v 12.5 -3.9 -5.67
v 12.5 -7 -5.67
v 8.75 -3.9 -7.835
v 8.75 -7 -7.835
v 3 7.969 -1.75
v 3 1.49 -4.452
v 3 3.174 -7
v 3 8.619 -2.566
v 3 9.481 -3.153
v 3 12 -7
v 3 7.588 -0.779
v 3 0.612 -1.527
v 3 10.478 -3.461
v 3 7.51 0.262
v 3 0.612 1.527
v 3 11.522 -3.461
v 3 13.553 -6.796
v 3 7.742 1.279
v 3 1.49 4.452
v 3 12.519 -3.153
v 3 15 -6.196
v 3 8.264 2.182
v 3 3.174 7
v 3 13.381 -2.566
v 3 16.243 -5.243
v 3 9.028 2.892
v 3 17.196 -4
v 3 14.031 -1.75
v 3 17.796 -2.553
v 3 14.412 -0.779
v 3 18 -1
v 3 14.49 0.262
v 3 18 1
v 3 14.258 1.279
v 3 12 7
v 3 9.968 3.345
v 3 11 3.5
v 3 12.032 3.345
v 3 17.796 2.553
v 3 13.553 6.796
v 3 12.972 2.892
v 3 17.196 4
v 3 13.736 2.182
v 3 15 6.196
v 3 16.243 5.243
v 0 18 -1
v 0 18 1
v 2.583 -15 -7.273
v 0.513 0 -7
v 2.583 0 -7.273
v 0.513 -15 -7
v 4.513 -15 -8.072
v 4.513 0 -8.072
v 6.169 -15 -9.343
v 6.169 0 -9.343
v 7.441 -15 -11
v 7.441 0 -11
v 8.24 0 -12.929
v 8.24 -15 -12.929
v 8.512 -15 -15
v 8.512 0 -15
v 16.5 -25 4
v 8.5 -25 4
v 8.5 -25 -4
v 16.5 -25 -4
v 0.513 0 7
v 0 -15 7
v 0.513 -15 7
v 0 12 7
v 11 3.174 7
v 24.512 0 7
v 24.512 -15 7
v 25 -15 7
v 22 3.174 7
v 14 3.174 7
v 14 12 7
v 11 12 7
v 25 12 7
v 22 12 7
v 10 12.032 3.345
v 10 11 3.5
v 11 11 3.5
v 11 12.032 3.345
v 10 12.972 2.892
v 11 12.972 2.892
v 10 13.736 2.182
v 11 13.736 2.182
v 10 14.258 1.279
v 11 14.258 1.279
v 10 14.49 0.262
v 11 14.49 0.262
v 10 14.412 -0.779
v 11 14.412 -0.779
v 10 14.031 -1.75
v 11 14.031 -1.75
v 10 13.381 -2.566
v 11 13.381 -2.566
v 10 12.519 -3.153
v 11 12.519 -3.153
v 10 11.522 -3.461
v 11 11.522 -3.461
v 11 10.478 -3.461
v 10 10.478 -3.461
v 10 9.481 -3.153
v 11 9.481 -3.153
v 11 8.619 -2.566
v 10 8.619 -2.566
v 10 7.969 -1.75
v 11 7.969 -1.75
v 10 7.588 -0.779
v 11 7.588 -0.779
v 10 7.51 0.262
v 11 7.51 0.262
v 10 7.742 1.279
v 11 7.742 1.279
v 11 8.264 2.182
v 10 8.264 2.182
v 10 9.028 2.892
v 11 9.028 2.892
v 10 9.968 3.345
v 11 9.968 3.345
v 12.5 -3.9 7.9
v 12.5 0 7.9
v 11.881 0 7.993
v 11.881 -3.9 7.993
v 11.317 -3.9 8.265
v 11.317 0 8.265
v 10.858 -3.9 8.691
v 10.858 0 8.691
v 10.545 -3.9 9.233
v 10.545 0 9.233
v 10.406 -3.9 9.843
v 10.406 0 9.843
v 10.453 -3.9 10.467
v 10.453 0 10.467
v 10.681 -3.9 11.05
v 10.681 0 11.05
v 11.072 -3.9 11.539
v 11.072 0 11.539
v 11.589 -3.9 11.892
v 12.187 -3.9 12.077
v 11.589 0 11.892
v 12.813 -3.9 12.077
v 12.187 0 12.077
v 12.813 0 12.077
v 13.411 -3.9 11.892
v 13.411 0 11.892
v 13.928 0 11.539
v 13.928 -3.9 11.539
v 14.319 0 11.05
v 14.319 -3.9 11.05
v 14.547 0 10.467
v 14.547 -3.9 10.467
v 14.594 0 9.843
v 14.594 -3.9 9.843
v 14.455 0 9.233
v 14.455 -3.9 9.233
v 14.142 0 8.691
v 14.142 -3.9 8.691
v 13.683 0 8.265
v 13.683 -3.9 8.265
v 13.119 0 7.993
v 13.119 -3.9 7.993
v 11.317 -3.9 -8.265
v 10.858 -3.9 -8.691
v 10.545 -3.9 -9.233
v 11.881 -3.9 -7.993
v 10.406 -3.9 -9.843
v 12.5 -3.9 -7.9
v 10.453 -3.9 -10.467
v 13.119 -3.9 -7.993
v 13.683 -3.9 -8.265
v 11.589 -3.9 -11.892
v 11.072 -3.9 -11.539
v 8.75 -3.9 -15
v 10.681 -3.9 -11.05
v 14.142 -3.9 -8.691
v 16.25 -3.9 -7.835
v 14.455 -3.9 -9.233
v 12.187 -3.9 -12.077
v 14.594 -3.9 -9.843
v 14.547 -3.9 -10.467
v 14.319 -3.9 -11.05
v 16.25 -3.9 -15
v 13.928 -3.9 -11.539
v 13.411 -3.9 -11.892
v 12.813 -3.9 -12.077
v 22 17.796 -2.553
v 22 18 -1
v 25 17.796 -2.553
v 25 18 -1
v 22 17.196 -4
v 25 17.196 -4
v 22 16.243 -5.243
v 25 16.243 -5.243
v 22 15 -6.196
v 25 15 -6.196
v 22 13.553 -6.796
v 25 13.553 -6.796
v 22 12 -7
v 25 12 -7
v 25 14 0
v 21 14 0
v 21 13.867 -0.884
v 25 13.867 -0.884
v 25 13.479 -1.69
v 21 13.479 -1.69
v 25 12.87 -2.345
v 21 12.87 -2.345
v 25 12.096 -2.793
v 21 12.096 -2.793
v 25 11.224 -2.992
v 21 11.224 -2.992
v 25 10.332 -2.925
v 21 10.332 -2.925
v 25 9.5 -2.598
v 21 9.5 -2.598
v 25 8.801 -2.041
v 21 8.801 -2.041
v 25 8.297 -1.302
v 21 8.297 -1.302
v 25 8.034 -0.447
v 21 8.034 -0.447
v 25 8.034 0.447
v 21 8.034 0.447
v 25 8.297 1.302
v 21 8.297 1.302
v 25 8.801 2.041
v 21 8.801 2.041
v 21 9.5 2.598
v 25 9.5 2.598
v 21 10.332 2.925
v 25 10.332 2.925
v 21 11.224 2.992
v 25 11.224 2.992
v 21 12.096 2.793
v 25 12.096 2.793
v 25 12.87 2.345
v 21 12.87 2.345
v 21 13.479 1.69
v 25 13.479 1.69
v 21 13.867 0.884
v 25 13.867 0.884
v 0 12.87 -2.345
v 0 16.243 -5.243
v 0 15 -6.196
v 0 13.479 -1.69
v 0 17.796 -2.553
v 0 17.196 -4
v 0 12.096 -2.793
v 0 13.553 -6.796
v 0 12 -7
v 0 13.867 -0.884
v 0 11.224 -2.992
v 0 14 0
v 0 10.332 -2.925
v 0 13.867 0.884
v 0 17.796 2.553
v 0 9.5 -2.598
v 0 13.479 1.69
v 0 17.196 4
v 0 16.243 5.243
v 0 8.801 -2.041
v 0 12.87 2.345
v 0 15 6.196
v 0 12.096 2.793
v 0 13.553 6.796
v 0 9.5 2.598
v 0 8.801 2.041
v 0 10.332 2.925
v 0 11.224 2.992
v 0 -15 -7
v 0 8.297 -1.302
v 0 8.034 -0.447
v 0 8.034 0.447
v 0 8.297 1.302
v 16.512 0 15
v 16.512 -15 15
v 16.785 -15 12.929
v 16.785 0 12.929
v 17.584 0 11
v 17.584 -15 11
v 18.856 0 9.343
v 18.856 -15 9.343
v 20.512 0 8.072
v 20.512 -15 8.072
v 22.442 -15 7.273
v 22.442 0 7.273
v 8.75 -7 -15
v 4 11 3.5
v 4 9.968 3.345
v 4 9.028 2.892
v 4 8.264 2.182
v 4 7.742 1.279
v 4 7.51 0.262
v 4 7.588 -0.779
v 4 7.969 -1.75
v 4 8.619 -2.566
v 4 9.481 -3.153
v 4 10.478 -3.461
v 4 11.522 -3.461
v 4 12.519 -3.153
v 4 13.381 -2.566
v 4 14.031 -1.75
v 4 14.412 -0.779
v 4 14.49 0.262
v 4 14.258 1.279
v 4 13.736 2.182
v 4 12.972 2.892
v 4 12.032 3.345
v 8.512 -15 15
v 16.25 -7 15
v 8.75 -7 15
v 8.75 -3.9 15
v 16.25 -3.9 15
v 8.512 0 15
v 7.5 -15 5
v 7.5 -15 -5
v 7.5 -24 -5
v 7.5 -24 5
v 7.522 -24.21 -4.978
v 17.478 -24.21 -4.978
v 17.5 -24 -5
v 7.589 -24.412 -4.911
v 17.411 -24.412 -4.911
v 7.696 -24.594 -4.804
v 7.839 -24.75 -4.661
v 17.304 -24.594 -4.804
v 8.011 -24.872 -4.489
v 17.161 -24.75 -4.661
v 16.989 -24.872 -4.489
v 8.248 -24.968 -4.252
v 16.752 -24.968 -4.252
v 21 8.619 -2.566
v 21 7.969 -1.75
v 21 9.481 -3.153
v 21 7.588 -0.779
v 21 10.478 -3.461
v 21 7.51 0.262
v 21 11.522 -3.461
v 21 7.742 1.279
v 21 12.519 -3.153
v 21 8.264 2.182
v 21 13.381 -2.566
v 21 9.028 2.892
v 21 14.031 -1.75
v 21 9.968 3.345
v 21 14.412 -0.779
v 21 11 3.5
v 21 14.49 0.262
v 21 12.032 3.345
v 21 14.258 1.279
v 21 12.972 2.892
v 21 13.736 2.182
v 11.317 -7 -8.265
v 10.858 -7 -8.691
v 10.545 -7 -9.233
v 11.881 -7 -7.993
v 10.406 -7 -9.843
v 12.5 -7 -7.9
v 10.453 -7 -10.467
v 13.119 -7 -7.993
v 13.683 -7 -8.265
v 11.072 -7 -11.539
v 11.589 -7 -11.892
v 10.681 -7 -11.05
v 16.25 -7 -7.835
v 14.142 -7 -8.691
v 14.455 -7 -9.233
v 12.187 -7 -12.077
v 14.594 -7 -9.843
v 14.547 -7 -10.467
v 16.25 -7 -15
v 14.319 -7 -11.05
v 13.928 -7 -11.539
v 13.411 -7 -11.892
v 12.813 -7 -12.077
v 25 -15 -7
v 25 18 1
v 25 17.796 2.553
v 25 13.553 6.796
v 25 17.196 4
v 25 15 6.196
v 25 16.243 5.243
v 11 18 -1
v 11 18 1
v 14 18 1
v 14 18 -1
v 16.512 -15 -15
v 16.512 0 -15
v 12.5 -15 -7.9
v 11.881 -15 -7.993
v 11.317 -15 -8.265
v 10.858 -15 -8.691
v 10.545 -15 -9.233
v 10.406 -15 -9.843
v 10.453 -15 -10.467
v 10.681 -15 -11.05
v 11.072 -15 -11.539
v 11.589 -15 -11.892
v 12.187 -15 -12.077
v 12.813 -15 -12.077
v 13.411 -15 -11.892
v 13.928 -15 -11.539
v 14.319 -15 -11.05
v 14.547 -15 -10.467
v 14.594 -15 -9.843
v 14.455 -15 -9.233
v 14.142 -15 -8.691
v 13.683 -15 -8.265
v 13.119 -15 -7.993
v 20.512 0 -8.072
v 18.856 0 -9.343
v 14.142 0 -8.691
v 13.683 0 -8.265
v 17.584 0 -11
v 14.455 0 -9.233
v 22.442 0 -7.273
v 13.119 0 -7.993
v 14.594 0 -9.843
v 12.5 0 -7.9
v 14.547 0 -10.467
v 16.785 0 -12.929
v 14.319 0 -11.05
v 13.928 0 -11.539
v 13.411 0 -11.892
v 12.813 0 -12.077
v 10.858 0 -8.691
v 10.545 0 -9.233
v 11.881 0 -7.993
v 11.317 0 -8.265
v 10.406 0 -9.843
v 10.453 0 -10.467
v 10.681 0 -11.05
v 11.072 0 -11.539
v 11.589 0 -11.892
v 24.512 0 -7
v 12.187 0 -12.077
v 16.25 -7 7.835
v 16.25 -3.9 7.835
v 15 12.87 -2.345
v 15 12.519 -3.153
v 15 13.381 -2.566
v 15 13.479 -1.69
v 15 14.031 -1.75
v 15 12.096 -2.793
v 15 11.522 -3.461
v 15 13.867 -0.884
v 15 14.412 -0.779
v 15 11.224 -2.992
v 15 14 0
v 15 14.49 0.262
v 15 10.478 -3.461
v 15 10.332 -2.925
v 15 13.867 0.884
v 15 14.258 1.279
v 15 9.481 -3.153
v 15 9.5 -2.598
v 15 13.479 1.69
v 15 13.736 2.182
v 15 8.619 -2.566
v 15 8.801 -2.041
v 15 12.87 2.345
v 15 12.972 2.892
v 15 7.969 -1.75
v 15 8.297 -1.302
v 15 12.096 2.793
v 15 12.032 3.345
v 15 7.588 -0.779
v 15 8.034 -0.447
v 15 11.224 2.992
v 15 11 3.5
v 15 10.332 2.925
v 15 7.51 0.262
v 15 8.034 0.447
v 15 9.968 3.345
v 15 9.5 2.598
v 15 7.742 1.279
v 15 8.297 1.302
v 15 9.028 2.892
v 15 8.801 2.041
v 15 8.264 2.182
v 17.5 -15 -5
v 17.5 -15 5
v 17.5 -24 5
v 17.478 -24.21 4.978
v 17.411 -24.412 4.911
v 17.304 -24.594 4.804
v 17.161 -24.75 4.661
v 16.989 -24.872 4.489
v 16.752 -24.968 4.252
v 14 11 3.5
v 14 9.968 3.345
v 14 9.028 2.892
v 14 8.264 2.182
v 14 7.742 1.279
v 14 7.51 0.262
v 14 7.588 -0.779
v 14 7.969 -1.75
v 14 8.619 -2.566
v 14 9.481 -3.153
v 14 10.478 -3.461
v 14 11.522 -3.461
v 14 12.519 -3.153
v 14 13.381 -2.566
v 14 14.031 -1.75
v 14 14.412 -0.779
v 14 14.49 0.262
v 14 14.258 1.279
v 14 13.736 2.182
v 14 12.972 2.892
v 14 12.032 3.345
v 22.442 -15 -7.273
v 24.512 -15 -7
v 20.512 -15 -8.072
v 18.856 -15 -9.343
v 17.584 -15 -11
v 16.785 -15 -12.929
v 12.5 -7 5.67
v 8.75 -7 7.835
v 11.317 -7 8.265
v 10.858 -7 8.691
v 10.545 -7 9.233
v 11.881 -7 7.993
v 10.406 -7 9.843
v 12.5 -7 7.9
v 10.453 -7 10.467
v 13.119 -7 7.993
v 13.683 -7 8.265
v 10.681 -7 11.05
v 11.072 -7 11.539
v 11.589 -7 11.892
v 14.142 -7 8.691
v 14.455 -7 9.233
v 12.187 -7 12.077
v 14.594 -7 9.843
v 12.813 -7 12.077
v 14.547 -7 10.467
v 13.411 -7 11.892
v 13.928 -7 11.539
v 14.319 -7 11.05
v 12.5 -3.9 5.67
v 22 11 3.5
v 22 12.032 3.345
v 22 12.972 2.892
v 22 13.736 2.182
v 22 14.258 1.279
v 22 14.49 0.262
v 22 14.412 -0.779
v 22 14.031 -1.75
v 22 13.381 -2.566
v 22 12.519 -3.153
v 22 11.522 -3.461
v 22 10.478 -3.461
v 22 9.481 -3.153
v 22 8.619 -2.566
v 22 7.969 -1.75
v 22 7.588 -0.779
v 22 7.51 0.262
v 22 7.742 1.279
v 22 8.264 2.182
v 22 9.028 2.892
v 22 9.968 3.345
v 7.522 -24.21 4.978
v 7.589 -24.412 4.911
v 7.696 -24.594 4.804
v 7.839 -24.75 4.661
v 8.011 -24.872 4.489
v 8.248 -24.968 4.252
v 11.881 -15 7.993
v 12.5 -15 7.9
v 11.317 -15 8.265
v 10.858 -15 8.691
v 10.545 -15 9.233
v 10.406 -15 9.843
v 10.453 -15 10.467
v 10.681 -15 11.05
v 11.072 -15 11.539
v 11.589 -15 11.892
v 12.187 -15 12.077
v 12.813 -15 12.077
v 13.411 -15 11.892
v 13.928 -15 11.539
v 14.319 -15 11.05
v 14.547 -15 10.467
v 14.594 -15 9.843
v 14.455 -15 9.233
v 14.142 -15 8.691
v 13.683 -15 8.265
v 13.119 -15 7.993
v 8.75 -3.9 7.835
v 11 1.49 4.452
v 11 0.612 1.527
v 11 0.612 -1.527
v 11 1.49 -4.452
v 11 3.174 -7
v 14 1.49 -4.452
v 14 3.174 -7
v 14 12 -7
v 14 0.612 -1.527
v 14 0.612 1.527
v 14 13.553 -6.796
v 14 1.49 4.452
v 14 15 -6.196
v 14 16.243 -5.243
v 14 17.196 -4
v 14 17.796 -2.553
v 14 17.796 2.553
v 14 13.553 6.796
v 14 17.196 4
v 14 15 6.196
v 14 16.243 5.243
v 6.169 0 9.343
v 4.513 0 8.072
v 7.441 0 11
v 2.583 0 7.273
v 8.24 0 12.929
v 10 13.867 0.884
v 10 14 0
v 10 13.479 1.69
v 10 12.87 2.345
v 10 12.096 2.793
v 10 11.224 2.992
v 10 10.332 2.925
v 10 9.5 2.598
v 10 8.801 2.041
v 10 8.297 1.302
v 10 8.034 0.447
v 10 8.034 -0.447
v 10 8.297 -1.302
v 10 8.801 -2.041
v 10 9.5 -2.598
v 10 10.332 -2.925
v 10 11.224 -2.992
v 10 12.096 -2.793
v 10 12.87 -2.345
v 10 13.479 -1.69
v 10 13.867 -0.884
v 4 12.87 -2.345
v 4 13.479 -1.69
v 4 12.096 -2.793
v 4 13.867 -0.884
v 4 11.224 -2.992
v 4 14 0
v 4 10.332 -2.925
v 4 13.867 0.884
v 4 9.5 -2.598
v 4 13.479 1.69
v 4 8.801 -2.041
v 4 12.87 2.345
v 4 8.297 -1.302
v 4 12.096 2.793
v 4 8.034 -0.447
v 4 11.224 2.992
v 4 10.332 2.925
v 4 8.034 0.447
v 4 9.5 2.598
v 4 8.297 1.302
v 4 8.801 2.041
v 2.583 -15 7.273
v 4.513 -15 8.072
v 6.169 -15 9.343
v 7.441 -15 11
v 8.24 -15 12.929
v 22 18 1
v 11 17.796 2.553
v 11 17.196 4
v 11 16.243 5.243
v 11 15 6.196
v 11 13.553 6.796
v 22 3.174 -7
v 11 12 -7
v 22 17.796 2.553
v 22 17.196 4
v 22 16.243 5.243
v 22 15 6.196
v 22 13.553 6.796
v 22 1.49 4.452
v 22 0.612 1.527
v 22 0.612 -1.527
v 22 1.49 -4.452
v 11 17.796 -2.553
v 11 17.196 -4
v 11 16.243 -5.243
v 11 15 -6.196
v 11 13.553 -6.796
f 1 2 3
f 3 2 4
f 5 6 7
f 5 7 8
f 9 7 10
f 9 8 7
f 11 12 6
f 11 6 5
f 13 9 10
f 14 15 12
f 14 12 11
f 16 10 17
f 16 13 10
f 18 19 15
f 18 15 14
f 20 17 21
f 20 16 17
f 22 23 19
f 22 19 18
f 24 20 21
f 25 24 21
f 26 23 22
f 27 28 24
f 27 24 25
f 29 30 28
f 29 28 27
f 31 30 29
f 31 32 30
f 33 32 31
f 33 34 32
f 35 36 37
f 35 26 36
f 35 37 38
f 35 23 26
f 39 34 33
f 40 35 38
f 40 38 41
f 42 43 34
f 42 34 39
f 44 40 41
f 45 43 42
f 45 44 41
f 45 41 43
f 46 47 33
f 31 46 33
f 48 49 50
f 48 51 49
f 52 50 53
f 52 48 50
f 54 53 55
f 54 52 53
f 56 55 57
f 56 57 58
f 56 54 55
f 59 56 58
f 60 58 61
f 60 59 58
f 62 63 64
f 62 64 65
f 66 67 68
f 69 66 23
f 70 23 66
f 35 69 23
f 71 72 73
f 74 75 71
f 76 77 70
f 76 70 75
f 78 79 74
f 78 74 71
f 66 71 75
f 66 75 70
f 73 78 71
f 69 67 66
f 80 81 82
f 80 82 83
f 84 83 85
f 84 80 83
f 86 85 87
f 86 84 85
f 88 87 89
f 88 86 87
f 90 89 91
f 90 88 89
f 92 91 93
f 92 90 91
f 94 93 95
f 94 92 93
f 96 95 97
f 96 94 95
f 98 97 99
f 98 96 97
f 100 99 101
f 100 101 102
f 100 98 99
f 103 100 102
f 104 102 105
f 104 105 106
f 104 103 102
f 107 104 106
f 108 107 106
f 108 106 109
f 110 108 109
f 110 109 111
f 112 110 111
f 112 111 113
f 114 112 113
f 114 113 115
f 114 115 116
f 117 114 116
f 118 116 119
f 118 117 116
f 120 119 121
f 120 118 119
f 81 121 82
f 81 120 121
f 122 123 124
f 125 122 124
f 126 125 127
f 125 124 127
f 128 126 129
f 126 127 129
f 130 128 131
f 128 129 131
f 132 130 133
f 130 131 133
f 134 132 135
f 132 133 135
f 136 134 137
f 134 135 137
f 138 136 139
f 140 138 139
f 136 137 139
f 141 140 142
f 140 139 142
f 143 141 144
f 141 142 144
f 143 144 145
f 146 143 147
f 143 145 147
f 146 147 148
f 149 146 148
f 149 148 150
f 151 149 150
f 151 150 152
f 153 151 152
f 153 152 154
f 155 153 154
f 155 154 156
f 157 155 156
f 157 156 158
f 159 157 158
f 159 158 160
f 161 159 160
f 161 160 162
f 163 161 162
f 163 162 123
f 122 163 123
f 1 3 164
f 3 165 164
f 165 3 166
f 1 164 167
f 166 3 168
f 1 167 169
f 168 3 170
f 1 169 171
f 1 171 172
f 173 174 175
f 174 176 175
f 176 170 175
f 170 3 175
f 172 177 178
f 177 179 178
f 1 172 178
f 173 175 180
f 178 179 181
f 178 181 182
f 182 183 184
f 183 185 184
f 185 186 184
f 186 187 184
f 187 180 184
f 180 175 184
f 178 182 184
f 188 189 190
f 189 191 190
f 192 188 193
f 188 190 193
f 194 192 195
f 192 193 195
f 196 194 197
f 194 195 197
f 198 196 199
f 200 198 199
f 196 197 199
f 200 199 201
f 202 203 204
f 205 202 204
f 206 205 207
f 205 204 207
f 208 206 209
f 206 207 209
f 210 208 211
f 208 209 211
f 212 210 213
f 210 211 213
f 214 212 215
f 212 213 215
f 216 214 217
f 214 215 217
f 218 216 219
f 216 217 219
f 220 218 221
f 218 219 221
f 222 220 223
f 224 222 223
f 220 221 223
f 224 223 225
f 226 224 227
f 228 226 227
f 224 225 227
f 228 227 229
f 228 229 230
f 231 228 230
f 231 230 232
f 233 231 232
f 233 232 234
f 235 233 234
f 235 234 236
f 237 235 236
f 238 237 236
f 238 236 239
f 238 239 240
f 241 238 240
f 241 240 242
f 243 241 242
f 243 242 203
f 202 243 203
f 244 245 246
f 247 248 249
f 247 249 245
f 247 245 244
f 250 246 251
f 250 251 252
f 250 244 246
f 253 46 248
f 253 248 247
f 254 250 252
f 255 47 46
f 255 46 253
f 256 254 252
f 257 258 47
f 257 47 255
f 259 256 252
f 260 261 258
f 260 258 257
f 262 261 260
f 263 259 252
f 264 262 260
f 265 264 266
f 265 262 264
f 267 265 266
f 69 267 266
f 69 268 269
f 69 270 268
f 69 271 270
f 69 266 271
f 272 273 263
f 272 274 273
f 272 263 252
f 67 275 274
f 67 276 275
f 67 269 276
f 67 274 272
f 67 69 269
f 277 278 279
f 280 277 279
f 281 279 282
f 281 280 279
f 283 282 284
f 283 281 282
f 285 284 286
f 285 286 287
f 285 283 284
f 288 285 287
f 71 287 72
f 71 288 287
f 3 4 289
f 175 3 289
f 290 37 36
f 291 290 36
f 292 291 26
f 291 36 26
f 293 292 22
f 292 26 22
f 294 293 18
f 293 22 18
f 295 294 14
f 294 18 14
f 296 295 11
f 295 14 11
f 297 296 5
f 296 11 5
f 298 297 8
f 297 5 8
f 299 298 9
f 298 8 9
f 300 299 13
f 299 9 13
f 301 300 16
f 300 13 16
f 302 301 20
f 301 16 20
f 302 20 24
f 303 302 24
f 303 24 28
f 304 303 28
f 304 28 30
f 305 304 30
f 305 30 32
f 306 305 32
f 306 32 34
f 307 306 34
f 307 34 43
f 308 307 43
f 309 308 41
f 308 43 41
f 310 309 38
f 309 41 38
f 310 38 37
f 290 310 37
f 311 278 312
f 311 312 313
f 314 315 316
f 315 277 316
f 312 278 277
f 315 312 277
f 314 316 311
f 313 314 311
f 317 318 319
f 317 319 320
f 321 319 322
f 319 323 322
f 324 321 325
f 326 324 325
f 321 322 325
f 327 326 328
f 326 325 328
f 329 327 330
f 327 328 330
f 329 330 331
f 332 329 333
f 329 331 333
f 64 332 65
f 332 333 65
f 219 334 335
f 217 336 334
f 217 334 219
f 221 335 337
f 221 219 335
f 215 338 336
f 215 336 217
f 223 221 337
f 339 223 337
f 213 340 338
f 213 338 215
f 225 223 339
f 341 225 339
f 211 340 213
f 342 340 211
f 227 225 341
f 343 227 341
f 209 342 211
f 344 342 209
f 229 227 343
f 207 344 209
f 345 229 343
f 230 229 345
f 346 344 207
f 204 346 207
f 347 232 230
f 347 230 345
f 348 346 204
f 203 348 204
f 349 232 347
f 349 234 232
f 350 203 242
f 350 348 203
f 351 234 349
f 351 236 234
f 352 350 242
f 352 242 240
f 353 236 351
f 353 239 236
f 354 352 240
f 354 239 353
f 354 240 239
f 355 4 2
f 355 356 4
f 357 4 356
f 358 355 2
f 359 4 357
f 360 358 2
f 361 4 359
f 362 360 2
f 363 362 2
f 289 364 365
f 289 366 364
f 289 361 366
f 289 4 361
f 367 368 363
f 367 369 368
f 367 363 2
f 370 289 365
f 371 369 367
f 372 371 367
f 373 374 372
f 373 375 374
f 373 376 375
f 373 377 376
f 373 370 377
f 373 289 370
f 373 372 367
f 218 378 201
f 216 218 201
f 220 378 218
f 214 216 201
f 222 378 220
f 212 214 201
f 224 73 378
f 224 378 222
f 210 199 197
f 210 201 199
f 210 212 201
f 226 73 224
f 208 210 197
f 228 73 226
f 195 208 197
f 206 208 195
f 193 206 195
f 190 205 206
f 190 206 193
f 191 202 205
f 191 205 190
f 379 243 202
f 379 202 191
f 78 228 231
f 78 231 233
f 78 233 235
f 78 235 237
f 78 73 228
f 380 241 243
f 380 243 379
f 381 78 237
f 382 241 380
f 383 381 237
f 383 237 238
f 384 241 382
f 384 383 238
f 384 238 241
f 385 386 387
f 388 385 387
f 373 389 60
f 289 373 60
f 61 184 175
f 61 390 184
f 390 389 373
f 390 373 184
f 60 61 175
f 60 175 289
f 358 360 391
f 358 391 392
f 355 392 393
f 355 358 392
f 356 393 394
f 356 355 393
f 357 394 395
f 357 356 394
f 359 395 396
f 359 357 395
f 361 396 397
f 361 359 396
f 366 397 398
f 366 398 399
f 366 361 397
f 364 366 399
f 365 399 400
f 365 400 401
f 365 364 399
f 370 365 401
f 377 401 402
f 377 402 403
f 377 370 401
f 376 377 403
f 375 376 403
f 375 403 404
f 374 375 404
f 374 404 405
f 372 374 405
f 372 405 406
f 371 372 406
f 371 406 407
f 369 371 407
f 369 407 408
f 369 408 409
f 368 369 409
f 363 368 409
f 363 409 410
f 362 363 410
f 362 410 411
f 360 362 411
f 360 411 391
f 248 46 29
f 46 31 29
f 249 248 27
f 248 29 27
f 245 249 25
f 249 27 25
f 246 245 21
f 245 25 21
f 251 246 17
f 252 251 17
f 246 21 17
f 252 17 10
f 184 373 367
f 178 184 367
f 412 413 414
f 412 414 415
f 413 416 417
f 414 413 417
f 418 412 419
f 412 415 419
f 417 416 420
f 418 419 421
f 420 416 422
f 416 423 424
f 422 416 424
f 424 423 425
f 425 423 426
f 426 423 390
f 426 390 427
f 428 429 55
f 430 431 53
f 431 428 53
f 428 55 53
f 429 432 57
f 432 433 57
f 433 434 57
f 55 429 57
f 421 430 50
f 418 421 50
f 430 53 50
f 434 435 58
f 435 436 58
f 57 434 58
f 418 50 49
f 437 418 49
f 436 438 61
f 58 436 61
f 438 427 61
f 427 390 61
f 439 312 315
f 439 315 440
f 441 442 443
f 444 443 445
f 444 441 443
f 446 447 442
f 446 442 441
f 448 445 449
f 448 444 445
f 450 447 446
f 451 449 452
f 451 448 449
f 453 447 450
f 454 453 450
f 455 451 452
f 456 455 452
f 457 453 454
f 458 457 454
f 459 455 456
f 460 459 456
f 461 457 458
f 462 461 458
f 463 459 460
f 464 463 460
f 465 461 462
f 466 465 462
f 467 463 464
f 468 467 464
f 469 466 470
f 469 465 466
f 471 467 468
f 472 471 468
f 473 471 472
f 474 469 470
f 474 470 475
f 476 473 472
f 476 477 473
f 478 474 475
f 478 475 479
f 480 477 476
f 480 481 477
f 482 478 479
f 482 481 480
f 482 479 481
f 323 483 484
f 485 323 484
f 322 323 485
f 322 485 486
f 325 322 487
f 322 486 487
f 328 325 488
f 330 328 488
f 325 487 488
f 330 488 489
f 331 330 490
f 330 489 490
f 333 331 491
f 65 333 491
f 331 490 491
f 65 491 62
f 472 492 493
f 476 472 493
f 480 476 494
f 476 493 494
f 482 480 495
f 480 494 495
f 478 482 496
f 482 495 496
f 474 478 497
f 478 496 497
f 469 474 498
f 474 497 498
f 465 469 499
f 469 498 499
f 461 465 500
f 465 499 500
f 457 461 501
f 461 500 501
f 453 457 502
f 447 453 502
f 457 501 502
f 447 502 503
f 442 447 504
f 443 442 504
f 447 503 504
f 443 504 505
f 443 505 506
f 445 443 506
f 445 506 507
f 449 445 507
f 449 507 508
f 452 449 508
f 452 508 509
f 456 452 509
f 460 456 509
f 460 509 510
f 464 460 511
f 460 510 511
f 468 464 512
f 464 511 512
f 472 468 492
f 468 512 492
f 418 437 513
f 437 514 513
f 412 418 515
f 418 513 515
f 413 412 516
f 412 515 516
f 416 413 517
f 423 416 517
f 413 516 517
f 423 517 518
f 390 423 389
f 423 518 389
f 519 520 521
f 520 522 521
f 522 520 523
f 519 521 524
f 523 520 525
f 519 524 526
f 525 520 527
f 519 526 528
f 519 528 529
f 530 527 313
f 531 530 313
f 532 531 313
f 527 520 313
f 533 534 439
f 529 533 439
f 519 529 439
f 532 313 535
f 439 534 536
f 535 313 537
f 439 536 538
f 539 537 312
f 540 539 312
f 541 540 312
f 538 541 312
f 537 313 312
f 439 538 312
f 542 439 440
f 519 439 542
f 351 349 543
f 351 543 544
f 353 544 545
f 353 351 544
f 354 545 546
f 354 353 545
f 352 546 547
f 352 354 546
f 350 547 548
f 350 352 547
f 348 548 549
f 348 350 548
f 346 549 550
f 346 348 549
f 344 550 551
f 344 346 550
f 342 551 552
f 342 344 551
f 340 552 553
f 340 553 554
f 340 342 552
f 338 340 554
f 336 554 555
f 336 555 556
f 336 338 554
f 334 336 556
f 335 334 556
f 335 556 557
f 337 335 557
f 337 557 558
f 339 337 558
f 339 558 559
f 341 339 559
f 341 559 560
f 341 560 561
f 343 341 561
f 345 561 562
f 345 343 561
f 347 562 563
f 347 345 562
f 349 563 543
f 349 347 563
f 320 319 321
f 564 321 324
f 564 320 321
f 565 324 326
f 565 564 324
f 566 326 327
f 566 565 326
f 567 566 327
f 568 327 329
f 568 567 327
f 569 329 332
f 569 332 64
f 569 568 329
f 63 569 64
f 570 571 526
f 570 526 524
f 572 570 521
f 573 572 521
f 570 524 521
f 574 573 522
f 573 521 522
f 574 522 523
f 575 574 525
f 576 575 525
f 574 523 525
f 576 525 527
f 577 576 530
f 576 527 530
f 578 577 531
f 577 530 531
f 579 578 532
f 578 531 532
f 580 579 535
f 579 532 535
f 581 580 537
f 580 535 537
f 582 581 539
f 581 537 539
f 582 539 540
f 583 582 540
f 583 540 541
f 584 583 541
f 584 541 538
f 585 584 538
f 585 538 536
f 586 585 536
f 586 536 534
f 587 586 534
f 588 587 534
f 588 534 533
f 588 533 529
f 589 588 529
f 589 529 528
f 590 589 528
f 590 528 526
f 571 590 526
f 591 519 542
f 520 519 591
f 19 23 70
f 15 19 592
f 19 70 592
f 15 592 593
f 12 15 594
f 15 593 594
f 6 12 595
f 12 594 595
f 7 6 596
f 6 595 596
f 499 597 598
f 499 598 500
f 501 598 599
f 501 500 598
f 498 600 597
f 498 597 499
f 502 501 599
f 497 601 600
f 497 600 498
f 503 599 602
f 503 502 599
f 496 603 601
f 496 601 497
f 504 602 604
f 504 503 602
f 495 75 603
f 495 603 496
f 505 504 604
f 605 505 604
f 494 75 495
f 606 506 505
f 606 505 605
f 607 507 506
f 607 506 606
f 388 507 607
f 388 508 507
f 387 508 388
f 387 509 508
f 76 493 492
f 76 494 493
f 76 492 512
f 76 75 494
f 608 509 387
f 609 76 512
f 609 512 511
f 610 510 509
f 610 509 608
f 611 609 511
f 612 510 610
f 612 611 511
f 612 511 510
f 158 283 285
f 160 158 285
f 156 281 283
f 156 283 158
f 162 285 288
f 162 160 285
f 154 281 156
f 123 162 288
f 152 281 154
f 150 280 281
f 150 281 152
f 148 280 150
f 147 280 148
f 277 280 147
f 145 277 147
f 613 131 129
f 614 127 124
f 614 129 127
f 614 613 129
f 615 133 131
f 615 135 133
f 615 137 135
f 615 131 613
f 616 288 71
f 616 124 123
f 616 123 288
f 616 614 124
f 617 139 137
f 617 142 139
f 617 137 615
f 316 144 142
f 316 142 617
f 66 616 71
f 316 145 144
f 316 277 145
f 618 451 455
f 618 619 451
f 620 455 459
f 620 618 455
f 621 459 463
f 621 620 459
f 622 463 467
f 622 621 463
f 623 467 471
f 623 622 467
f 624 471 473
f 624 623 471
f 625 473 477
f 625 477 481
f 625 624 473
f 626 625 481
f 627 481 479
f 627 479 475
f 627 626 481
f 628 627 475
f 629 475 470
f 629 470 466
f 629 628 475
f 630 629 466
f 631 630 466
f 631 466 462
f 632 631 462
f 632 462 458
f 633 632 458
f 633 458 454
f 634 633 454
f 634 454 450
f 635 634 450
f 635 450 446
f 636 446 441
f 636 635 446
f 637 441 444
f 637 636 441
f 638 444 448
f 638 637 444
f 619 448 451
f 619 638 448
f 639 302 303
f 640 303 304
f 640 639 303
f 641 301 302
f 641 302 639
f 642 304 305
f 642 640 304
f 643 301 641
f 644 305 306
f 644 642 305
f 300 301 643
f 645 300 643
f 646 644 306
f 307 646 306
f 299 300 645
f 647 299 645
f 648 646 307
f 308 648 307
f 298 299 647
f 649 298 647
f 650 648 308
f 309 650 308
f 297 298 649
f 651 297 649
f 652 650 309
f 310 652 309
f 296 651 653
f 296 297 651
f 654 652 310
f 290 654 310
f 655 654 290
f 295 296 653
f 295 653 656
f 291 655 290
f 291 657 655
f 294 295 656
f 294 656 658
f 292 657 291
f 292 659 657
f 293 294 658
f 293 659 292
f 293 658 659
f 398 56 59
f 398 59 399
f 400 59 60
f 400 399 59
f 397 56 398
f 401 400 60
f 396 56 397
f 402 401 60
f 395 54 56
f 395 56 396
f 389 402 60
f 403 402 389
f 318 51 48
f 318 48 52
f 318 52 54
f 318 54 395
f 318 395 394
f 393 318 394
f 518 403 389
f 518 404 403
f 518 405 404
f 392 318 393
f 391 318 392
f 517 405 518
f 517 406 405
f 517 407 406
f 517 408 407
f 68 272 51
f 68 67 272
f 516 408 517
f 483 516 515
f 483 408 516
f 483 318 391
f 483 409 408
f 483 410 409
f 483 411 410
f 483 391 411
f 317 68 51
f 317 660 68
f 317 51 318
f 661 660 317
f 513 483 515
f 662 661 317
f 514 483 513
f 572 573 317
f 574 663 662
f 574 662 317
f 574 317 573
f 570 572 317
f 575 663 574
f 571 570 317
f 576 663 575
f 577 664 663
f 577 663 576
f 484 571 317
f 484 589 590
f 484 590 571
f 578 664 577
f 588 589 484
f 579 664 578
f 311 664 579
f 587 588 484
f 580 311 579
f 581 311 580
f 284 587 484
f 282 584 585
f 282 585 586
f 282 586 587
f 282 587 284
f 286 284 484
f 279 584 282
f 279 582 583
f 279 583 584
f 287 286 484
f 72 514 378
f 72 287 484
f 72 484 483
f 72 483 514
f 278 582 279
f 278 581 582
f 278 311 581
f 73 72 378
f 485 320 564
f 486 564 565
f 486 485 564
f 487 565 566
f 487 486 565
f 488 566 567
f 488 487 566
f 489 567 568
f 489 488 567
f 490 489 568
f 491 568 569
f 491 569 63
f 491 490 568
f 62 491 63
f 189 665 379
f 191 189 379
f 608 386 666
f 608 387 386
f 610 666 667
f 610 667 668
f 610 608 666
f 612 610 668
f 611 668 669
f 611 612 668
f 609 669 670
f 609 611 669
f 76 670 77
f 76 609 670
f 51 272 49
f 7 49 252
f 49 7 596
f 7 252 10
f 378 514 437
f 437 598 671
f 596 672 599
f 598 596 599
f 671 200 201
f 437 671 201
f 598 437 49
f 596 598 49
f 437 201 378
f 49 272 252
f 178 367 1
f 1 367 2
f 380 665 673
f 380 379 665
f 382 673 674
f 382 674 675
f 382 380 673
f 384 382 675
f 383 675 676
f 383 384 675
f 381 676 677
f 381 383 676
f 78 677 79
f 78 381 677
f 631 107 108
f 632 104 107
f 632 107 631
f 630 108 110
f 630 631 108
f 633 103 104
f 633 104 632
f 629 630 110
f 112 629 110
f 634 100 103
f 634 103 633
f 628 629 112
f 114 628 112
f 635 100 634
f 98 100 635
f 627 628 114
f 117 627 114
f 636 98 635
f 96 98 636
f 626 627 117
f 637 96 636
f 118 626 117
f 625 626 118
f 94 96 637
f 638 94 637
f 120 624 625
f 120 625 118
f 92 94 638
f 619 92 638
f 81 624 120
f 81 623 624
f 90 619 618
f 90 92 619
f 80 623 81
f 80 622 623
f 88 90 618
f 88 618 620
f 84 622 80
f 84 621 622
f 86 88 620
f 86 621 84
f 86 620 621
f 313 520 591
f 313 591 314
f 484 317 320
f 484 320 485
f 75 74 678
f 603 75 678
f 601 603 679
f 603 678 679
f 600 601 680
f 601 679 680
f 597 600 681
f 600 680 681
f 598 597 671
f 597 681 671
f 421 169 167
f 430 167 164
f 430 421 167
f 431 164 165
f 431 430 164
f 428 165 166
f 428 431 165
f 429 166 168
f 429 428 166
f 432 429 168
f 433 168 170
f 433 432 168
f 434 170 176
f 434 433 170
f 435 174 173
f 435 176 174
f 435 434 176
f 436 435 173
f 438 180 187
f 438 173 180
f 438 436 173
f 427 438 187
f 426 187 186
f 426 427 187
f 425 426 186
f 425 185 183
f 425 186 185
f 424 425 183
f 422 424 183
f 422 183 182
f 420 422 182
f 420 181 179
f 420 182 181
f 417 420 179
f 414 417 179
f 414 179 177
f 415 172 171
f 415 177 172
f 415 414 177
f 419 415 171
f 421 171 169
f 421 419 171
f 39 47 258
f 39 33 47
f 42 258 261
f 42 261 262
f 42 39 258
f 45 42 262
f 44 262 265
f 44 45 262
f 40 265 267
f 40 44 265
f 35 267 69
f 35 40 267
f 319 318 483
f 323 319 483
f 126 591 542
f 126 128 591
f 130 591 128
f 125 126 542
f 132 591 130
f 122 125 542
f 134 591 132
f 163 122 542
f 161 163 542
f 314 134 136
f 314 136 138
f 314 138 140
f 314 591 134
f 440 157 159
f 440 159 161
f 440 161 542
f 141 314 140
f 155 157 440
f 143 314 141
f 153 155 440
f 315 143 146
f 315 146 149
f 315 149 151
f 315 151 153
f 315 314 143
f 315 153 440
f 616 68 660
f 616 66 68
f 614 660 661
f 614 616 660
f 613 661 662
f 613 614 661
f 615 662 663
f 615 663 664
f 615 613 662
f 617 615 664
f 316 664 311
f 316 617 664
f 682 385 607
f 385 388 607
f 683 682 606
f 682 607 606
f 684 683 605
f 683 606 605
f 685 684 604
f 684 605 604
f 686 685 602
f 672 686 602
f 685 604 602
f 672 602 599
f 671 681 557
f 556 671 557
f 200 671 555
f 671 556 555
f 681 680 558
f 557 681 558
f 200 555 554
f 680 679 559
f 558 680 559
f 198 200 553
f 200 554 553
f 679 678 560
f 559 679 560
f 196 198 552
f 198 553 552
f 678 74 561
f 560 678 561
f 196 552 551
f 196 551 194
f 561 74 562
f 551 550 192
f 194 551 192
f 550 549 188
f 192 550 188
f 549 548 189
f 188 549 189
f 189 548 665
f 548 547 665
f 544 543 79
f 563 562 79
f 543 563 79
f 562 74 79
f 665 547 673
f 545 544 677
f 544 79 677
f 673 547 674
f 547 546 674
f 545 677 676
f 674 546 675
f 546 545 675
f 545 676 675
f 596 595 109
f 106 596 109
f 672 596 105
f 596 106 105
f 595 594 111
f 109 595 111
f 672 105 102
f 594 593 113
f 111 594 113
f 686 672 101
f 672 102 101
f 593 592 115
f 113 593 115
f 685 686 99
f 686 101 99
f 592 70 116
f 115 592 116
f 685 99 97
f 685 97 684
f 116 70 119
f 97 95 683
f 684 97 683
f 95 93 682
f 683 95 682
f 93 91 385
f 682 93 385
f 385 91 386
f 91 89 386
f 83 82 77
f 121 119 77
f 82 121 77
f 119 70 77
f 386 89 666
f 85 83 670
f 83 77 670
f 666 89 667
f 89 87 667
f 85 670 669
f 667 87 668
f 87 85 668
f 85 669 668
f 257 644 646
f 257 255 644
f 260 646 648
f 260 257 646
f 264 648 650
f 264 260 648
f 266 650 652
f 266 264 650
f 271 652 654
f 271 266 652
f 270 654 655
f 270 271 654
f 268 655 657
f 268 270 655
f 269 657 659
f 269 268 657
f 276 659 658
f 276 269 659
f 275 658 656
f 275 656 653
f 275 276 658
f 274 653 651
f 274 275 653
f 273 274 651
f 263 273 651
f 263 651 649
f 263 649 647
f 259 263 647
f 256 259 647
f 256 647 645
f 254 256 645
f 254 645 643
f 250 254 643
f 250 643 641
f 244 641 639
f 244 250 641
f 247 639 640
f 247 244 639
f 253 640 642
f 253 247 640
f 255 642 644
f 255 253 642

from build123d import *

# Parameters (mm, degrees)
SKETCH_1_W               = 3
SKETCH_1_H               = 18
EXTRUDE_2_DEPTH          = 7
CUT_EXTRUDE_1_DEPTH      = 32.591137998
CUT_EXTRUDE_1_DEPTH_BACK = 7.591137998
CUT_EXTRUDE_1_START      = -25
SKETCH_3_R               = 3
SKETCH_15_R              = 3.5
SKETCH_15_R_2            = 3
EXTRUDE_11_DEPTH         = 1
EXTRUDE_START            = 1
SKETCH_5_R               = 3.5
SKETCH_5_R_2             = 3
EXTRUDE_6_DEPTH          = 1
SKETCH_6_R               = 3.5
SKETCH_6_R_2             = 3
EXTRUDE_7_DEPTH          = 1
SKETCH_7_R               = 3.5
SKETCH_7_R_2             = 3
EXTRUDE_8_DEPTH          = 1
FILLET_1_R               = 6
SKETCH_8_W               = 10
SKETCH_8_H               = 10
EXTRUDE_9_DEPTH          = 10
FILLET_2_R               = 1
EXTRUDE_START_2          = -22
EXTRUDE_14_DEPTH         = 19
SKETCH_17_W              = 8
SKETCH_17_H              = 8
SKETCH_17_R              = 2.1
EXTRUDE_12_DEPTH         = 8
EXTRUDE_START_3          = -7
SKETCH_17_2_W            = 8
SKETCH_17_2_H            = 8
SKETCH_17_2_R            = 2.1
EXTRUDE_13_DEPTH         = 7
CUT_EXTRUDE_2_DEPTH      = 3.1
FILLET_4_R               = 8


with BuildPart() as part:
    # 草图1 → 凸台-拉伸2 (new, symmetric)
    with BuildSketch(Plane.XY):
        Polygon((3, 0), (0, 0), (0, -15), (25, -15), (25, 0), (22, 0), (14, 0), (11, 0), align=None)
        with Locations((12.5, 9)):
            Rectangle(SKETCH_1_W, SKETCH_1_H)
        with Locations((23.5, 9)):
            Rectangle(SKETCH_1_W, SKETCH_1_H)
        with Locations((1.5, 9)):
            Rectangle(SKETCH_1_W, SKETCH_1_H)
    extrude(amount=EXTRUDE_2_DEPTH, both=True)

    # 草图3 → 切除-拉伸1 (cut, two sides: drawn at the far end of the back side and taken through both)
    with BuildSketch(Plane(origin=(25, 0, 0), x_dir=(0, 0, -1), z_dir=(1, 0, 0)).offset(CUT_EXTRUDE_1_START - CUT_EXTRUDE_1_DEPTH_BACK)):
        with Locations(Location((0, 11, 0), (0, 0, 90))):
            Circle(SKETCH_3_R)
    extrude(amount=CUT_EXTRUDE_1_DEPTH + CUT_EXTRUDE_1_DEPTH_BACK, mode=Mode.SUBTRACT)

    # 草图15 → 凸台-拉伸11 (add)
    with BuildSketch(Plane(origin=(3, 0, 0), x_dir=(0, 0, -1), z_dir=(1, 0, 0))):
        with Locations(Location((0, 11, 0), (0, 0, 180))):
            Circle(SKETCH_15_R)
        with Locations(Location((0, 11, 0), (0, 0, 90))):
            Circle(SKETCH_15_R_2, mode=Mode.SUBTRACT)
    extrude(amount=EXTRUDE_11_DEPTH)

    # 草图5 → 凸台-拉伸6 (add)
    with BuildSketch(Plane.ZY.offset(-11).offset(EXTRUDE_START)):
        with Locations((0, 11)):
            Circle(SKETCH_5_R)
        with Locations(Location((0, 11, 0), (0, 0, 90))):
            Circle(SKETCH_5_R_2, mode=Mode.SUBTRACT)
    extrude(amount=-EXTRUDE_6_DEPTH)

    # 草图6 → 凸台-拉伸7 (add)
    with BuildSketch(Plane(origin=(14, 0, 0), x_dir=(0, 0, -1), z_dir=(1, 0, 0))):
        with Locations(Location((0, 11, 0), (0, 0, 180))):
            Circle(SKETCH_6_R)
        with Locations(Location((0, 11, 0), (0, 0, 90))):
            Circle(SKETCH_6_R_2, mode=Mode.SUBTRACT)
    extrude(amount=EXTRUDE_7_DEPTH)

    # 草图7 → 凸台-拉伸8 (add)
    with BuildSketch(Plane.ZY.offset(-22).offset(EXTRUDE_START)):
        with Locations((0, 11)):
            Circle(SKETCH_7_R)
        with Locations(Location((0, 11, 0), (0, 0, 90))):
            Circle(SKETCH_7_R_2, mode=Mode.SUBTRACT)
    extrude(amount=-EXTRUDE_8_DEPTH)

    # 圆角1
    fillet_1_edges = [part.edges().sort_by_distance(p)[0] for p in [
        (23.5, 18, 7),
        (1.5, 18, -7),
        (12.5, 18, -7),
        (23.5, 18, -7),
        (12.5, 18, 7),
        (1.5, 18, 7),
    ]]
    fillet(fillet_1_edges, radius=FILLET_1_R)

    # 草图8 → 凸台-拉伸9 (add)
    with BuildSketch(Plane.XZ.offset(15)):
        with Locations((12.5, 0)):
            Rectangle(SKETCH_8_W, SKETCH_8_H)
    extrude(amount=EXTRUDE_9_DEPTH)

    # 圆角2
    fillet_2_edges = [part.edges().sort_by_distance(p)[0] for p in [
        (12.5, -25, 5),
        (7.5, -25, 0),
        (12.5, -25, -5),
        (17.5, -25, 0),
    ]]
    fillet(fillet_2_edges, radius=FILLET_2_R)

    # 草图23 → 凸台-拉伸14 (add)
    with BuildSketch(Plane.ZY.offset(EXTRUDE_START_2)):
        with BuildLine():
            Line((-7, -7), (7, -7))
            Line((7, -7), (7, 3.173762079))
            ThreePointArc((7, 3.173762079), (0, 0.5), (-7, 3.173762079))
            Line((-7, 3.173762079), (-7, -7))
        make_face()
    extrude(amount=EXTRUDE_14_DEPTH)

    # 草图17 → 凸台-拉伸12 (add)
    with BuildSketch(Plane(origin=(0, -7, 0), x_dir=(-1, 0, 0), z_dir=(0, -1, 0))):
        with Locations((-12.51246086, 11)):
            Rectangle(SKETCH_17_W, SKETCH_17_H)
        with Locations(Location((-12.5, 10, 0), (0, 0, 270))):
            Circle(SKETCH_17_R, mode=Mode.SUBTRACT)
    extrude_12 = extrude(amount=EXTRUDE_12_DEPTH)

    # 草图17<2> → 凸台-拉伸13 (add)
    with BuildSketch(Plane(origin=(0, -7, 0), x_dir=(-1, 0, 0), z_dir=(0, -1, 0)).offset(EXTRUDE_START_3)):
        with Locations((-12.51246086, 11)):
            Rectangle(SKETCH_17_2_W, SKETCH_17_2_H)
        with Locations(Location((-12.5, 10, 0), (0, 0, 270))):
            Circle(SKETCH_17_2_R, mode=Mode.SUBTRACT)
    extrude_13 = extrude(amount=EXTRUDE_13_DEPTH)

    # 草图18 → 切除-拉伸2 (cut)
    with BuildSketch(Plane(origin=(0, -7, 0), x_dir=(-1, 0, 0), z_dir=(0, -1, 0))):
        Polygon((-8.75, 15), (-8.75, 12.165063509), (-12.5, 14.330127019), (-16.25, 12.165063509), (-16.25, 15), align=None)
        Polygon((-8.75, 7.834936491), (-8.75, 12.165063509), (-12.5, 14.330127019), (-16.25, 12.165063509), (-16.25, 7.834936491), (-12.5, 5.669872981), align=None)
    cut_extrude_2 = extrude(amount=-CUT_EXTRUDE_2_DEPTH, mode=Mode.SUBTRACT)

    # 镜向1: 凸台-拉伸12, 凸台-拉伸13, 切除-拉伸2 across plane
    add(extrude_12.mirror(Plane.XY))
    add(extrude_13.mirror(Plane.XY))
    add(cut_extrude_2.mirror(Plane.XY), mode=Mode.SUBTRACT)

    # 圆角4
    fillet_4_edges = [part.edges().sort_by_distance(p)[0] for p in [
        (8.51246086, -7.5, -7),
        (16.51246086, -7.5, -7),
        (16.51246086, -7.5, 7),
        (8.51246086, -7.5, 7),
    ]]
    fillet(fillet_4_edges, radius=FILLET_4_R - 0.0001)  # a hair under: the kernel refuses the full size


solid = part.part
